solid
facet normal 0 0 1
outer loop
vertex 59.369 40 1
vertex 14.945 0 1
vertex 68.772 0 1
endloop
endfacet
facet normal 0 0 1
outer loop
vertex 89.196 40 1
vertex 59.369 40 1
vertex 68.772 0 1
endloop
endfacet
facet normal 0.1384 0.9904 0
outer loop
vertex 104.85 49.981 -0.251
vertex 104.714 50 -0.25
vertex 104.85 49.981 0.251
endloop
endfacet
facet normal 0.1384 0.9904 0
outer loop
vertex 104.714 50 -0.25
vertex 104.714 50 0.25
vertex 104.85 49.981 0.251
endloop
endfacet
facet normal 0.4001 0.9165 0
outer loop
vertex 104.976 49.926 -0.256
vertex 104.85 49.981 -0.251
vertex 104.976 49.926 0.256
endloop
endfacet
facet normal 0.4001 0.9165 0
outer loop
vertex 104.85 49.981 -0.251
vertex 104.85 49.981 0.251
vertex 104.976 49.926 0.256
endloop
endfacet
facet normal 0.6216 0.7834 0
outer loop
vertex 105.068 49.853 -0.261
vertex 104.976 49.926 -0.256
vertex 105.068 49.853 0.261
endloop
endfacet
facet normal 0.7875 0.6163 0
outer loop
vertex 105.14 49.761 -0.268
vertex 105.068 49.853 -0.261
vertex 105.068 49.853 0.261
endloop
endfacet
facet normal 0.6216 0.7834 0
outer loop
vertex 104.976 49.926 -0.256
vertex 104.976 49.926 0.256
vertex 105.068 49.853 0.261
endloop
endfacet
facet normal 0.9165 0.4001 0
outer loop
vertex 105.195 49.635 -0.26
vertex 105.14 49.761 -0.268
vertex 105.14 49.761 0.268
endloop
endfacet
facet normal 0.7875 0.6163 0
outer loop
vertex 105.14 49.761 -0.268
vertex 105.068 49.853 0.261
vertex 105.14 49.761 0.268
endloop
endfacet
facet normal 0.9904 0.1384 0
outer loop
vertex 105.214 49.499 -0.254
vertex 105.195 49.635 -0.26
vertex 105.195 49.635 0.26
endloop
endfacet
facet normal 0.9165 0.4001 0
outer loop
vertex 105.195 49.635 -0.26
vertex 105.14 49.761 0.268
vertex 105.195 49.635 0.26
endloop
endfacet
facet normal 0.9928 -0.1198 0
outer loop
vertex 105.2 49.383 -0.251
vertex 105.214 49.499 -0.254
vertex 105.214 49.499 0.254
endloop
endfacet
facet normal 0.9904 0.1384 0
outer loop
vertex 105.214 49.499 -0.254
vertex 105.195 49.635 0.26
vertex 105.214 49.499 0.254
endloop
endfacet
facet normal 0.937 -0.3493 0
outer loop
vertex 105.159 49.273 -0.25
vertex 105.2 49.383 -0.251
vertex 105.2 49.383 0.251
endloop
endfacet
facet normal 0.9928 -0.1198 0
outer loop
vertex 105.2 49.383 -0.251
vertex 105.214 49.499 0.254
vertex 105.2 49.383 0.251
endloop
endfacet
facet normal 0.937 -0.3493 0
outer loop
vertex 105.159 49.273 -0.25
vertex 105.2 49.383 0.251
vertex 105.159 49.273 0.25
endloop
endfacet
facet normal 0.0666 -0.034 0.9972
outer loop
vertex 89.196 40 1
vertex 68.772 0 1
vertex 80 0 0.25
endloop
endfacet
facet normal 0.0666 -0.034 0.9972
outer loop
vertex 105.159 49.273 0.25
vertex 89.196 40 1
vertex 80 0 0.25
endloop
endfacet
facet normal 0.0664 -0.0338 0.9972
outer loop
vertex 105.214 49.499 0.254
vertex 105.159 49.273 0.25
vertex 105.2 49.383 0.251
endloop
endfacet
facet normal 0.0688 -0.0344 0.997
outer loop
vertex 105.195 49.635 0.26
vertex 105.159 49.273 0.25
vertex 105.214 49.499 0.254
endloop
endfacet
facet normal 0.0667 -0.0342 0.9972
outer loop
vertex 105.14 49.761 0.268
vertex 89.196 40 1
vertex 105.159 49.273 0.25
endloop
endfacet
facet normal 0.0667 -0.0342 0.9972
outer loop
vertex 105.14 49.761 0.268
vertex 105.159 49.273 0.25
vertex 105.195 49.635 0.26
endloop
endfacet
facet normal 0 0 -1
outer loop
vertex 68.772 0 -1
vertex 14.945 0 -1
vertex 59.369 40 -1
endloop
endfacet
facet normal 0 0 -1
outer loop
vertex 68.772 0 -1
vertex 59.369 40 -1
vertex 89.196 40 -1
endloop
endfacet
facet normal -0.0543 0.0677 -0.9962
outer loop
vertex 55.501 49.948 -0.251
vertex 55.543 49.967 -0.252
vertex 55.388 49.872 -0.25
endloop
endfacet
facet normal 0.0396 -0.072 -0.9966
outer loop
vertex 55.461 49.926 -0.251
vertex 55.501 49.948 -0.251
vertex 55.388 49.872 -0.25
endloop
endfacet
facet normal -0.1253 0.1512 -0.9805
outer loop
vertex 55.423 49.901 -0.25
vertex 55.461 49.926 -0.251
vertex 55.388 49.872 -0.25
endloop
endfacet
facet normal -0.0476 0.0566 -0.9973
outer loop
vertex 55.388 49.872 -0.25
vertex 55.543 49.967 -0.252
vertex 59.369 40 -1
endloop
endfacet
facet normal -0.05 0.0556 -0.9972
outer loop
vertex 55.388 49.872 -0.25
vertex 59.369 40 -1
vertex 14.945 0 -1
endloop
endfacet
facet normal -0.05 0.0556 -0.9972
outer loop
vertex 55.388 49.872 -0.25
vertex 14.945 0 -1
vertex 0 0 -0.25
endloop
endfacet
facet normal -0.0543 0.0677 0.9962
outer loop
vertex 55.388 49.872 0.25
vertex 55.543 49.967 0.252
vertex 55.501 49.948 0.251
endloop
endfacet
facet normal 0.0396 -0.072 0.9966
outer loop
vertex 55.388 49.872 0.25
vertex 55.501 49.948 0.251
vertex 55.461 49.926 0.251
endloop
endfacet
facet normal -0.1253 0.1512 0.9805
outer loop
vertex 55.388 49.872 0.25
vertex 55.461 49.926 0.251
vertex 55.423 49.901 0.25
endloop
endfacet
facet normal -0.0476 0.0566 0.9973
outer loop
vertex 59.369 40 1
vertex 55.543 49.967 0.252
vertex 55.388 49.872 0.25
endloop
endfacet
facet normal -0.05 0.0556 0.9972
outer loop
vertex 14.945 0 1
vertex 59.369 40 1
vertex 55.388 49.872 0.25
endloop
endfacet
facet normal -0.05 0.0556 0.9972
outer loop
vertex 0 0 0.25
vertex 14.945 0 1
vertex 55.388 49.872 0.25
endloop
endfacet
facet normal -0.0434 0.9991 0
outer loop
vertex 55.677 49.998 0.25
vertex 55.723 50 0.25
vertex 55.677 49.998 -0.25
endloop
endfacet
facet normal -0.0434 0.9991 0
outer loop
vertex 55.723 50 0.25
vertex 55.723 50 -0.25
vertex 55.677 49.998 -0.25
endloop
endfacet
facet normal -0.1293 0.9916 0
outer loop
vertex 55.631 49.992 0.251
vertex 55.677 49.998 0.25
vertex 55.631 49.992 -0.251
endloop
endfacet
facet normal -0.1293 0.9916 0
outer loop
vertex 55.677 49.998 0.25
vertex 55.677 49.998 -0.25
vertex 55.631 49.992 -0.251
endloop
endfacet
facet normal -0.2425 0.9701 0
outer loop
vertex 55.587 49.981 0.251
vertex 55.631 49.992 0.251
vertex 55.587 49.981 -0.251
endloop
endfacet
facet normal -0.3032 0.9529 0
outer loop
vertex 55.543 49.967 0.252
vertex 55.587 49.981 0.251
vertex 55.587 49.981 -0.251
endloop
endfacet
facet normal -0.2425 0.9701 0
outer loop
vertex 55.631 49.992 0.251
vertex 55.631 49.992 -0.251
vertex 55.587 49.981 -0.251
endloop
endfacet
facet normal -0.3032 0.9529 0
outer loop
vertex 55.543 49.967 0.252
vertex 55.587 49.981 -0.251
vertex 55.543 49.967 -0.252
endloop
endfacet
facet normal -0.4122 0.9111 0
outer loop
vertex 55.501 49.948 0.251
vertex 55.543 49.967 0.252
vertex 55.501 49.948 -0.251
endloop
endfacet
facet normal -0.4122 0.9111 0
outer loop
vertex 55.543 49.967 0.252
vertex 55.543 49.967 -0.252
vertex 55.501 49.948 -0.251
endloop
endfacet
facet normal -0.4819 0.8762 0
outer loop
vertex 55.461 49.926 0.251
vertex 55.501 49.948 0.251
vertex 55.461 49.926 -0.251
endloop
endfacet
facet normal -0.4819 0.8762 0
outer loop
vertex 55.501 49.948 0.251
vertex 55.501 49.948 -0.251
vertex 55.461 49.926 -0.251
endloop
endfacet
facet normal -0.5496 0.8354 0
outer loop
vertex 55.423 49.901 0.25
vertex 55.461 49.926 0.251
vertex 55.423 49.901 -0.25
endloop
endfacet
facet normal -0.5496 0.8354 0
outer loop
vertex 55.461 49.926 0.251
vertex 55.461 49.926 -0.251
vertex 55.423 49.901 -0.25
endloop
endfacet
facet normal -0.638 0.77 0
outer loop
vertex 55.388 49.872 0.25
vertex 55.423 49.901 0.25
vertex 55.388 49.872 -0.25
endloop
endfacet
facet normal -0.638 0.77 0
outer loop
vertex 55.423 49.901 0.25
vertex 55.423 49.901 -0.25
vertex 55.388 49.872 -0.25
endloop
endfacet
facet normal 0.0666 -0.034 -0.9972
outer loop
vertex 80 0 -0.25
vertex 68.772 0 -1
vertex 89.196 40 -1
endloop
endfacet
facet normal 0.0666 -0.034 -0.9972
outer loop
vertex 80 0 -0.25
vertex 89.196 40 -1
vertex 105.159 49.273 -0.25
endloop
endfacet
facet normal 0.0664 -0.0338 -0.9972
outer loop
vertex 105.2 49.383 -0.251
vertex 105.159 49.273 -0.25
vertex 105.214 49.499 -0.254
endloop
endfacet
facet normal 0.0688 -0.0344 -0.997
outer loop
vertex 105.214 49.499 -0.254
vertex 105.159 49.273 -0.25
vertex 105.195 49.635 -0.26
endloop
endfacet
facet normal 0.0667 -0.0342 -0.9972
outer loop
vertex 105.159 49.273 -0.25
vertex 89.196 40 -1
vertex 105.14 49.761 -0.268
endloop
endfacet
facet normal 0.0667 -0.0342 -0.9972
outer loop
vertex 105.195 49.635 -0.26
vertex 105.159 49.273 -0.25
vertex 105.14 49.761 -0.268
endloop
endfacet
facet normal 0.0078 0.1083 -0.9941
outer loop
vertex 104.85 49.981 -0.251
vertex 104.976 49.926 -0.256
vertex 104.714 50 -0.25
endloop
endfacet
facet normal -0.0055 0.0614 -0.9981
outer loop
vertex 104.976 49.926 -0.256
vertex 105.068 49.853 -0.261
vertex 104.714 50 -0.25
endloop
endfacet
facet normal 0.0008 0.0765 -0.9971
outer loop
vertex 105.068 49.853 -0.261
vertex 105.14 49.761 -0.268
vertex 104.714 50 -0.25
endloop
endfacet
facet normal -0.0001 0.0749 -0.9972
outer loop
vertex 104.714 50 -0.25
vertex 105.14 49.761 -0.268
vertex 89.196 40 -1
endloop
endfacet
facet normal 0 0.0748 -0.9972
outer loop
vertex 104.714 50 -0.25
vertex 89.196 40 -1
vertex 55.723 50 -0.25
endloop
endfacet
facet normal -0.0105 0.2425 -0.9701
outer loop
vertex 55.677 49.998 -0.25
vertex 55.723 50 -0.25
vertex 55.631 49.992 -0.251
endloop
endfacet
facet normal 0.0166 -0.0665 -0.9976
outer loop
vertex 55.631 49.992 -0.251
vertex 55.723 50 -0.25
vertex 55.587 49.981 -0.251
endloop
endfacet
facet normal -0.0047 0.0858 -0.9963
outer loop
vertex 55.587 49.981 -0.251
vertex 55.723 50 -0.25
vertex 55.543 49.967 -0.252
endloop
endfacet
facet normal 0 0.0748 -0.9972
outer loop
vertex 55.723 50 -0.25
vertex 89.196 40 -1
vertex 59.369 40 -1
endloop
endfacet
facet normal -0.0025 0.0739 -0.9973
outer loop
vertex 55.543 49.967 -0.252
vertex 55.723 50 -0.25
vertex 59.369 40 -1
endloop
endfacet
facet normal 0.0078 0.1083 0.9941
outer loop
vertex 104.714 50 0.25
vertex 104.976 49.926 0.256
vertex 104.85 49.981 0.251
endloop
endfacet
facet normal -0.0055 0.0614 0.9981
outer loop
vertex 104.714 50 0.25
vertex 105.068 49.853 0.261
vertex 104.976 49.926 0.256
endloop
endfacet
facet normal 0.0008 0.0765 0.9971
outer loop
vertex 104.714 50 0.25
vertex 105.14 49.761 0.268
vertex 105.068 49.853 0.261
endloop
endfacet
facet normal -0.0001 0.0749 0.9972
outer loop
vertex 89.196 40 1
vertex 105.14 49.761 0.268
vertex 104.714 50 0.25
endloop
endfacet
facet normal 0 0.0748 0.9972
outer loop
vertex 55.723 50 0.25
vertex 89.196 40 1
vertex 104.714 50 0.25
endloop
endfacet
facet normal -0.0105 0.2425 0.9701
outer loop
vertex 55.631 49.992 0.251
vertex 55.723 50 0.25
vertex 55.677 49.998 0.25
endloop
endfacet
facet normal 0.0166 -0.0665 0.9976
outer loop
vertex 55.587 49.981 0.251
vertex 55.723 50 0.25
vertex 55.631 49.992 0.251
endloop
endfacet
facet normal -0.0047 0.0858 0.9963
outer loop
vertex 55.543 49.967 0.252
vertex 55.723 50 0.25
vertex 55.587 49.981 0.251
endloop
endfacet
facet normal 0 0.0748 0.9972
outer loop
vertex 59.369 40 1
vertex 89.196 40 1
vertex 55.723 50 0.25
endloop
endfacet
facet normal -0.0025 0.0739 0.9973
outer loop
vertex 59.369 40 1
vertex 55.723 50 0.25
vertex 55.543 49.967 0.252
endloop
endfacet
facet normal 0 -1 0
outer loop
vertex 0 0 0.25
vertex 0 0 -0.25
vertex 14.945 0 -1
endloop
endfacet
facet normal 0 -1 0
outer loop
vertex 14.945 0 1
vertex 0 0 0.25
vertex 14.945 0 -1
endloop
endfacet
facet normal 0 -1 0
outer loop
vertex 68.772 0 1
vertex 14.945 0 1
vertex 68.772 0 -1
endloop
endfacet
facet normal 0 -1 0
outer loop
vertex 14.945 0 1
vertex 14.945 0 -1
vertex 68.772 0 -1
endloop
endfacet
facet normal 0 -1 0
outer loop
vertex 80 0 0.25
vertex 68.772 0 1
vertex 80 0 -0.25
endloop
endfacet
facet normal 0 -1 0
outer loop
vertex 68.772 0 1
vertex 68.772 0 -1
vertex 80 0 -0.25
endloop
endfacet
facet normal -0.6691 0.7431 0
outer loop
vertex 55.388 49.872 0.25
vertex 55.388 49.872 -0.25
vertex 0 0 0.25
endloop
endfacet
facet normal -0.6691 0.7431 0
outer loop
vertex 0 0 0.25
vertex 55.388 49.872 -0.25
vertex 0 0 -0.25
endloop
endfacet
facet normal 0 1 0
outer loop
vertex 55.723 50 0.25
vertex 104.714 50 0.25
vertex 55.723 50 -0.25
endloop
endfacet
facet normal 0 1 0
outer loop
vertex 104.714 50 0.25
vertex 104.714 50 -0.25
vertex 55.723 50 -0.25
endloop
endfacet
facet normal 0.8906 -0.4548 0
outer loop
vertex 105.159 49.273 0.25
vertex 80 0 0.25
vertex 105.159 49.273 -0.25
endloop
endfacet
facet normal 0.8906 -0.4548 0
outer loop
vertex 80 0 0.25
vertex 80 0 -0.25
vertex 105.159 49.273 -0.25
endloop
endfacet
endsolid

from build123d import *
from OCP.BRepFilletAPI import BRepFilletAPI_MakeChamfer

# Parameters (mm, degrees)
BOSS_EXTRUDE1_DEPTH = 1
CHAMFER1_SIZE       = 0.75
CHAMFER1_SIZE2      = 10
FILLET1_R           = 0.5


# Read off the part's stored shape, not the designer's step: Mirror1
with BuildPart() as part:
    # Sketch1 → Boss-Extrude1 (new, symmetric)
    with BuildSketch(Plane.XY):
        Polygon((0, 0), (80, 0), (105.530625741, 50), (55.530625741, 50), align=None)
    extrude(amount=BOSS_EXTRUDE1_DEPTH, both=True)

    # Chamfer1: one chamfer whose edges measure the first distance from different faces: ONE call of the kernel's chamfer builder (chamfer() names one face for all edges)
    chamfer1_edges_1 = [part.edges().sort_by_distance(p)[0] for p in [
        (92.765312871, 25, 1),
    ]]
    chamfer1_side_1 = [part.faces().sort_by_distance(p)[0] for p in [
        (92.765312871, 25, 0),
    ]]
    chamfer1_edges_2 = [part.edges().sort_by_distance(p)[0] for p in [
        (80.530625741, 50, 1),
    ]]
    chamfer1_side_2 = [part.faces().sort_by_distance(p)[0] for p in [
        (80.530625741, 50, 0),
    ]]
    chamfer1_edges_3 = [part.edges().sort_by_distance(p)[0] for p in [
        (27.765312871, 25, 1),
    ]]
    chamfer1_side_3 = [part.faces().sort_by_distance(p)[0] for p in [
        (27.765312871, 25, 0),
    ]]
    chamfer1 = BRepFilletAPI_MakeChamfer(part.part.solid().wrapped)
    for e in chamfer1_edges_1:
        chamfer1.Add(CHAMFER1_SIZE, CHAMFER1_SIZE2, e.wrapped, chamfer1_side_1[0].wrapped)  # the first distance lies on this face
    for e in chamfer1_edges_2:
        chamfer1.Add(CHAMFER1_SIZE, CHAMFER1_SIZE2, e.wrapped, chamfer1_side_2[0].wrapped)  # the first distance lies on this face
    for e in chamfer1_edges_3:
        chamfer1.Add(CHAMFER1_SIZE, CHAMFER1_SIZE2, e.wrapped, chamfer1_side_3[0].wrapped)  # the first distance lies on this face
    add(Compound.cast(chamfer1.Shape()), mode=Mode.REPLACE)

    # Mirror1
    split(bisect_by=Plane.XY, keep=Keep.TOP)

    # Mirror1 2: part across plane


with BuildPart() as part_1:
    add(part.part)
    add(part.part.mirror(Plane.XY))

    # Fillet1
    fillet1_edges = [part_1.edges().sort_by_distance(p)[0] for p in [
        (55.530625741, 50, 0),
        (105.530625741, 50, 0),
    ]]
    fillet(fillet1_edges, radius=FILLET1_R)


solid = part_1.part
